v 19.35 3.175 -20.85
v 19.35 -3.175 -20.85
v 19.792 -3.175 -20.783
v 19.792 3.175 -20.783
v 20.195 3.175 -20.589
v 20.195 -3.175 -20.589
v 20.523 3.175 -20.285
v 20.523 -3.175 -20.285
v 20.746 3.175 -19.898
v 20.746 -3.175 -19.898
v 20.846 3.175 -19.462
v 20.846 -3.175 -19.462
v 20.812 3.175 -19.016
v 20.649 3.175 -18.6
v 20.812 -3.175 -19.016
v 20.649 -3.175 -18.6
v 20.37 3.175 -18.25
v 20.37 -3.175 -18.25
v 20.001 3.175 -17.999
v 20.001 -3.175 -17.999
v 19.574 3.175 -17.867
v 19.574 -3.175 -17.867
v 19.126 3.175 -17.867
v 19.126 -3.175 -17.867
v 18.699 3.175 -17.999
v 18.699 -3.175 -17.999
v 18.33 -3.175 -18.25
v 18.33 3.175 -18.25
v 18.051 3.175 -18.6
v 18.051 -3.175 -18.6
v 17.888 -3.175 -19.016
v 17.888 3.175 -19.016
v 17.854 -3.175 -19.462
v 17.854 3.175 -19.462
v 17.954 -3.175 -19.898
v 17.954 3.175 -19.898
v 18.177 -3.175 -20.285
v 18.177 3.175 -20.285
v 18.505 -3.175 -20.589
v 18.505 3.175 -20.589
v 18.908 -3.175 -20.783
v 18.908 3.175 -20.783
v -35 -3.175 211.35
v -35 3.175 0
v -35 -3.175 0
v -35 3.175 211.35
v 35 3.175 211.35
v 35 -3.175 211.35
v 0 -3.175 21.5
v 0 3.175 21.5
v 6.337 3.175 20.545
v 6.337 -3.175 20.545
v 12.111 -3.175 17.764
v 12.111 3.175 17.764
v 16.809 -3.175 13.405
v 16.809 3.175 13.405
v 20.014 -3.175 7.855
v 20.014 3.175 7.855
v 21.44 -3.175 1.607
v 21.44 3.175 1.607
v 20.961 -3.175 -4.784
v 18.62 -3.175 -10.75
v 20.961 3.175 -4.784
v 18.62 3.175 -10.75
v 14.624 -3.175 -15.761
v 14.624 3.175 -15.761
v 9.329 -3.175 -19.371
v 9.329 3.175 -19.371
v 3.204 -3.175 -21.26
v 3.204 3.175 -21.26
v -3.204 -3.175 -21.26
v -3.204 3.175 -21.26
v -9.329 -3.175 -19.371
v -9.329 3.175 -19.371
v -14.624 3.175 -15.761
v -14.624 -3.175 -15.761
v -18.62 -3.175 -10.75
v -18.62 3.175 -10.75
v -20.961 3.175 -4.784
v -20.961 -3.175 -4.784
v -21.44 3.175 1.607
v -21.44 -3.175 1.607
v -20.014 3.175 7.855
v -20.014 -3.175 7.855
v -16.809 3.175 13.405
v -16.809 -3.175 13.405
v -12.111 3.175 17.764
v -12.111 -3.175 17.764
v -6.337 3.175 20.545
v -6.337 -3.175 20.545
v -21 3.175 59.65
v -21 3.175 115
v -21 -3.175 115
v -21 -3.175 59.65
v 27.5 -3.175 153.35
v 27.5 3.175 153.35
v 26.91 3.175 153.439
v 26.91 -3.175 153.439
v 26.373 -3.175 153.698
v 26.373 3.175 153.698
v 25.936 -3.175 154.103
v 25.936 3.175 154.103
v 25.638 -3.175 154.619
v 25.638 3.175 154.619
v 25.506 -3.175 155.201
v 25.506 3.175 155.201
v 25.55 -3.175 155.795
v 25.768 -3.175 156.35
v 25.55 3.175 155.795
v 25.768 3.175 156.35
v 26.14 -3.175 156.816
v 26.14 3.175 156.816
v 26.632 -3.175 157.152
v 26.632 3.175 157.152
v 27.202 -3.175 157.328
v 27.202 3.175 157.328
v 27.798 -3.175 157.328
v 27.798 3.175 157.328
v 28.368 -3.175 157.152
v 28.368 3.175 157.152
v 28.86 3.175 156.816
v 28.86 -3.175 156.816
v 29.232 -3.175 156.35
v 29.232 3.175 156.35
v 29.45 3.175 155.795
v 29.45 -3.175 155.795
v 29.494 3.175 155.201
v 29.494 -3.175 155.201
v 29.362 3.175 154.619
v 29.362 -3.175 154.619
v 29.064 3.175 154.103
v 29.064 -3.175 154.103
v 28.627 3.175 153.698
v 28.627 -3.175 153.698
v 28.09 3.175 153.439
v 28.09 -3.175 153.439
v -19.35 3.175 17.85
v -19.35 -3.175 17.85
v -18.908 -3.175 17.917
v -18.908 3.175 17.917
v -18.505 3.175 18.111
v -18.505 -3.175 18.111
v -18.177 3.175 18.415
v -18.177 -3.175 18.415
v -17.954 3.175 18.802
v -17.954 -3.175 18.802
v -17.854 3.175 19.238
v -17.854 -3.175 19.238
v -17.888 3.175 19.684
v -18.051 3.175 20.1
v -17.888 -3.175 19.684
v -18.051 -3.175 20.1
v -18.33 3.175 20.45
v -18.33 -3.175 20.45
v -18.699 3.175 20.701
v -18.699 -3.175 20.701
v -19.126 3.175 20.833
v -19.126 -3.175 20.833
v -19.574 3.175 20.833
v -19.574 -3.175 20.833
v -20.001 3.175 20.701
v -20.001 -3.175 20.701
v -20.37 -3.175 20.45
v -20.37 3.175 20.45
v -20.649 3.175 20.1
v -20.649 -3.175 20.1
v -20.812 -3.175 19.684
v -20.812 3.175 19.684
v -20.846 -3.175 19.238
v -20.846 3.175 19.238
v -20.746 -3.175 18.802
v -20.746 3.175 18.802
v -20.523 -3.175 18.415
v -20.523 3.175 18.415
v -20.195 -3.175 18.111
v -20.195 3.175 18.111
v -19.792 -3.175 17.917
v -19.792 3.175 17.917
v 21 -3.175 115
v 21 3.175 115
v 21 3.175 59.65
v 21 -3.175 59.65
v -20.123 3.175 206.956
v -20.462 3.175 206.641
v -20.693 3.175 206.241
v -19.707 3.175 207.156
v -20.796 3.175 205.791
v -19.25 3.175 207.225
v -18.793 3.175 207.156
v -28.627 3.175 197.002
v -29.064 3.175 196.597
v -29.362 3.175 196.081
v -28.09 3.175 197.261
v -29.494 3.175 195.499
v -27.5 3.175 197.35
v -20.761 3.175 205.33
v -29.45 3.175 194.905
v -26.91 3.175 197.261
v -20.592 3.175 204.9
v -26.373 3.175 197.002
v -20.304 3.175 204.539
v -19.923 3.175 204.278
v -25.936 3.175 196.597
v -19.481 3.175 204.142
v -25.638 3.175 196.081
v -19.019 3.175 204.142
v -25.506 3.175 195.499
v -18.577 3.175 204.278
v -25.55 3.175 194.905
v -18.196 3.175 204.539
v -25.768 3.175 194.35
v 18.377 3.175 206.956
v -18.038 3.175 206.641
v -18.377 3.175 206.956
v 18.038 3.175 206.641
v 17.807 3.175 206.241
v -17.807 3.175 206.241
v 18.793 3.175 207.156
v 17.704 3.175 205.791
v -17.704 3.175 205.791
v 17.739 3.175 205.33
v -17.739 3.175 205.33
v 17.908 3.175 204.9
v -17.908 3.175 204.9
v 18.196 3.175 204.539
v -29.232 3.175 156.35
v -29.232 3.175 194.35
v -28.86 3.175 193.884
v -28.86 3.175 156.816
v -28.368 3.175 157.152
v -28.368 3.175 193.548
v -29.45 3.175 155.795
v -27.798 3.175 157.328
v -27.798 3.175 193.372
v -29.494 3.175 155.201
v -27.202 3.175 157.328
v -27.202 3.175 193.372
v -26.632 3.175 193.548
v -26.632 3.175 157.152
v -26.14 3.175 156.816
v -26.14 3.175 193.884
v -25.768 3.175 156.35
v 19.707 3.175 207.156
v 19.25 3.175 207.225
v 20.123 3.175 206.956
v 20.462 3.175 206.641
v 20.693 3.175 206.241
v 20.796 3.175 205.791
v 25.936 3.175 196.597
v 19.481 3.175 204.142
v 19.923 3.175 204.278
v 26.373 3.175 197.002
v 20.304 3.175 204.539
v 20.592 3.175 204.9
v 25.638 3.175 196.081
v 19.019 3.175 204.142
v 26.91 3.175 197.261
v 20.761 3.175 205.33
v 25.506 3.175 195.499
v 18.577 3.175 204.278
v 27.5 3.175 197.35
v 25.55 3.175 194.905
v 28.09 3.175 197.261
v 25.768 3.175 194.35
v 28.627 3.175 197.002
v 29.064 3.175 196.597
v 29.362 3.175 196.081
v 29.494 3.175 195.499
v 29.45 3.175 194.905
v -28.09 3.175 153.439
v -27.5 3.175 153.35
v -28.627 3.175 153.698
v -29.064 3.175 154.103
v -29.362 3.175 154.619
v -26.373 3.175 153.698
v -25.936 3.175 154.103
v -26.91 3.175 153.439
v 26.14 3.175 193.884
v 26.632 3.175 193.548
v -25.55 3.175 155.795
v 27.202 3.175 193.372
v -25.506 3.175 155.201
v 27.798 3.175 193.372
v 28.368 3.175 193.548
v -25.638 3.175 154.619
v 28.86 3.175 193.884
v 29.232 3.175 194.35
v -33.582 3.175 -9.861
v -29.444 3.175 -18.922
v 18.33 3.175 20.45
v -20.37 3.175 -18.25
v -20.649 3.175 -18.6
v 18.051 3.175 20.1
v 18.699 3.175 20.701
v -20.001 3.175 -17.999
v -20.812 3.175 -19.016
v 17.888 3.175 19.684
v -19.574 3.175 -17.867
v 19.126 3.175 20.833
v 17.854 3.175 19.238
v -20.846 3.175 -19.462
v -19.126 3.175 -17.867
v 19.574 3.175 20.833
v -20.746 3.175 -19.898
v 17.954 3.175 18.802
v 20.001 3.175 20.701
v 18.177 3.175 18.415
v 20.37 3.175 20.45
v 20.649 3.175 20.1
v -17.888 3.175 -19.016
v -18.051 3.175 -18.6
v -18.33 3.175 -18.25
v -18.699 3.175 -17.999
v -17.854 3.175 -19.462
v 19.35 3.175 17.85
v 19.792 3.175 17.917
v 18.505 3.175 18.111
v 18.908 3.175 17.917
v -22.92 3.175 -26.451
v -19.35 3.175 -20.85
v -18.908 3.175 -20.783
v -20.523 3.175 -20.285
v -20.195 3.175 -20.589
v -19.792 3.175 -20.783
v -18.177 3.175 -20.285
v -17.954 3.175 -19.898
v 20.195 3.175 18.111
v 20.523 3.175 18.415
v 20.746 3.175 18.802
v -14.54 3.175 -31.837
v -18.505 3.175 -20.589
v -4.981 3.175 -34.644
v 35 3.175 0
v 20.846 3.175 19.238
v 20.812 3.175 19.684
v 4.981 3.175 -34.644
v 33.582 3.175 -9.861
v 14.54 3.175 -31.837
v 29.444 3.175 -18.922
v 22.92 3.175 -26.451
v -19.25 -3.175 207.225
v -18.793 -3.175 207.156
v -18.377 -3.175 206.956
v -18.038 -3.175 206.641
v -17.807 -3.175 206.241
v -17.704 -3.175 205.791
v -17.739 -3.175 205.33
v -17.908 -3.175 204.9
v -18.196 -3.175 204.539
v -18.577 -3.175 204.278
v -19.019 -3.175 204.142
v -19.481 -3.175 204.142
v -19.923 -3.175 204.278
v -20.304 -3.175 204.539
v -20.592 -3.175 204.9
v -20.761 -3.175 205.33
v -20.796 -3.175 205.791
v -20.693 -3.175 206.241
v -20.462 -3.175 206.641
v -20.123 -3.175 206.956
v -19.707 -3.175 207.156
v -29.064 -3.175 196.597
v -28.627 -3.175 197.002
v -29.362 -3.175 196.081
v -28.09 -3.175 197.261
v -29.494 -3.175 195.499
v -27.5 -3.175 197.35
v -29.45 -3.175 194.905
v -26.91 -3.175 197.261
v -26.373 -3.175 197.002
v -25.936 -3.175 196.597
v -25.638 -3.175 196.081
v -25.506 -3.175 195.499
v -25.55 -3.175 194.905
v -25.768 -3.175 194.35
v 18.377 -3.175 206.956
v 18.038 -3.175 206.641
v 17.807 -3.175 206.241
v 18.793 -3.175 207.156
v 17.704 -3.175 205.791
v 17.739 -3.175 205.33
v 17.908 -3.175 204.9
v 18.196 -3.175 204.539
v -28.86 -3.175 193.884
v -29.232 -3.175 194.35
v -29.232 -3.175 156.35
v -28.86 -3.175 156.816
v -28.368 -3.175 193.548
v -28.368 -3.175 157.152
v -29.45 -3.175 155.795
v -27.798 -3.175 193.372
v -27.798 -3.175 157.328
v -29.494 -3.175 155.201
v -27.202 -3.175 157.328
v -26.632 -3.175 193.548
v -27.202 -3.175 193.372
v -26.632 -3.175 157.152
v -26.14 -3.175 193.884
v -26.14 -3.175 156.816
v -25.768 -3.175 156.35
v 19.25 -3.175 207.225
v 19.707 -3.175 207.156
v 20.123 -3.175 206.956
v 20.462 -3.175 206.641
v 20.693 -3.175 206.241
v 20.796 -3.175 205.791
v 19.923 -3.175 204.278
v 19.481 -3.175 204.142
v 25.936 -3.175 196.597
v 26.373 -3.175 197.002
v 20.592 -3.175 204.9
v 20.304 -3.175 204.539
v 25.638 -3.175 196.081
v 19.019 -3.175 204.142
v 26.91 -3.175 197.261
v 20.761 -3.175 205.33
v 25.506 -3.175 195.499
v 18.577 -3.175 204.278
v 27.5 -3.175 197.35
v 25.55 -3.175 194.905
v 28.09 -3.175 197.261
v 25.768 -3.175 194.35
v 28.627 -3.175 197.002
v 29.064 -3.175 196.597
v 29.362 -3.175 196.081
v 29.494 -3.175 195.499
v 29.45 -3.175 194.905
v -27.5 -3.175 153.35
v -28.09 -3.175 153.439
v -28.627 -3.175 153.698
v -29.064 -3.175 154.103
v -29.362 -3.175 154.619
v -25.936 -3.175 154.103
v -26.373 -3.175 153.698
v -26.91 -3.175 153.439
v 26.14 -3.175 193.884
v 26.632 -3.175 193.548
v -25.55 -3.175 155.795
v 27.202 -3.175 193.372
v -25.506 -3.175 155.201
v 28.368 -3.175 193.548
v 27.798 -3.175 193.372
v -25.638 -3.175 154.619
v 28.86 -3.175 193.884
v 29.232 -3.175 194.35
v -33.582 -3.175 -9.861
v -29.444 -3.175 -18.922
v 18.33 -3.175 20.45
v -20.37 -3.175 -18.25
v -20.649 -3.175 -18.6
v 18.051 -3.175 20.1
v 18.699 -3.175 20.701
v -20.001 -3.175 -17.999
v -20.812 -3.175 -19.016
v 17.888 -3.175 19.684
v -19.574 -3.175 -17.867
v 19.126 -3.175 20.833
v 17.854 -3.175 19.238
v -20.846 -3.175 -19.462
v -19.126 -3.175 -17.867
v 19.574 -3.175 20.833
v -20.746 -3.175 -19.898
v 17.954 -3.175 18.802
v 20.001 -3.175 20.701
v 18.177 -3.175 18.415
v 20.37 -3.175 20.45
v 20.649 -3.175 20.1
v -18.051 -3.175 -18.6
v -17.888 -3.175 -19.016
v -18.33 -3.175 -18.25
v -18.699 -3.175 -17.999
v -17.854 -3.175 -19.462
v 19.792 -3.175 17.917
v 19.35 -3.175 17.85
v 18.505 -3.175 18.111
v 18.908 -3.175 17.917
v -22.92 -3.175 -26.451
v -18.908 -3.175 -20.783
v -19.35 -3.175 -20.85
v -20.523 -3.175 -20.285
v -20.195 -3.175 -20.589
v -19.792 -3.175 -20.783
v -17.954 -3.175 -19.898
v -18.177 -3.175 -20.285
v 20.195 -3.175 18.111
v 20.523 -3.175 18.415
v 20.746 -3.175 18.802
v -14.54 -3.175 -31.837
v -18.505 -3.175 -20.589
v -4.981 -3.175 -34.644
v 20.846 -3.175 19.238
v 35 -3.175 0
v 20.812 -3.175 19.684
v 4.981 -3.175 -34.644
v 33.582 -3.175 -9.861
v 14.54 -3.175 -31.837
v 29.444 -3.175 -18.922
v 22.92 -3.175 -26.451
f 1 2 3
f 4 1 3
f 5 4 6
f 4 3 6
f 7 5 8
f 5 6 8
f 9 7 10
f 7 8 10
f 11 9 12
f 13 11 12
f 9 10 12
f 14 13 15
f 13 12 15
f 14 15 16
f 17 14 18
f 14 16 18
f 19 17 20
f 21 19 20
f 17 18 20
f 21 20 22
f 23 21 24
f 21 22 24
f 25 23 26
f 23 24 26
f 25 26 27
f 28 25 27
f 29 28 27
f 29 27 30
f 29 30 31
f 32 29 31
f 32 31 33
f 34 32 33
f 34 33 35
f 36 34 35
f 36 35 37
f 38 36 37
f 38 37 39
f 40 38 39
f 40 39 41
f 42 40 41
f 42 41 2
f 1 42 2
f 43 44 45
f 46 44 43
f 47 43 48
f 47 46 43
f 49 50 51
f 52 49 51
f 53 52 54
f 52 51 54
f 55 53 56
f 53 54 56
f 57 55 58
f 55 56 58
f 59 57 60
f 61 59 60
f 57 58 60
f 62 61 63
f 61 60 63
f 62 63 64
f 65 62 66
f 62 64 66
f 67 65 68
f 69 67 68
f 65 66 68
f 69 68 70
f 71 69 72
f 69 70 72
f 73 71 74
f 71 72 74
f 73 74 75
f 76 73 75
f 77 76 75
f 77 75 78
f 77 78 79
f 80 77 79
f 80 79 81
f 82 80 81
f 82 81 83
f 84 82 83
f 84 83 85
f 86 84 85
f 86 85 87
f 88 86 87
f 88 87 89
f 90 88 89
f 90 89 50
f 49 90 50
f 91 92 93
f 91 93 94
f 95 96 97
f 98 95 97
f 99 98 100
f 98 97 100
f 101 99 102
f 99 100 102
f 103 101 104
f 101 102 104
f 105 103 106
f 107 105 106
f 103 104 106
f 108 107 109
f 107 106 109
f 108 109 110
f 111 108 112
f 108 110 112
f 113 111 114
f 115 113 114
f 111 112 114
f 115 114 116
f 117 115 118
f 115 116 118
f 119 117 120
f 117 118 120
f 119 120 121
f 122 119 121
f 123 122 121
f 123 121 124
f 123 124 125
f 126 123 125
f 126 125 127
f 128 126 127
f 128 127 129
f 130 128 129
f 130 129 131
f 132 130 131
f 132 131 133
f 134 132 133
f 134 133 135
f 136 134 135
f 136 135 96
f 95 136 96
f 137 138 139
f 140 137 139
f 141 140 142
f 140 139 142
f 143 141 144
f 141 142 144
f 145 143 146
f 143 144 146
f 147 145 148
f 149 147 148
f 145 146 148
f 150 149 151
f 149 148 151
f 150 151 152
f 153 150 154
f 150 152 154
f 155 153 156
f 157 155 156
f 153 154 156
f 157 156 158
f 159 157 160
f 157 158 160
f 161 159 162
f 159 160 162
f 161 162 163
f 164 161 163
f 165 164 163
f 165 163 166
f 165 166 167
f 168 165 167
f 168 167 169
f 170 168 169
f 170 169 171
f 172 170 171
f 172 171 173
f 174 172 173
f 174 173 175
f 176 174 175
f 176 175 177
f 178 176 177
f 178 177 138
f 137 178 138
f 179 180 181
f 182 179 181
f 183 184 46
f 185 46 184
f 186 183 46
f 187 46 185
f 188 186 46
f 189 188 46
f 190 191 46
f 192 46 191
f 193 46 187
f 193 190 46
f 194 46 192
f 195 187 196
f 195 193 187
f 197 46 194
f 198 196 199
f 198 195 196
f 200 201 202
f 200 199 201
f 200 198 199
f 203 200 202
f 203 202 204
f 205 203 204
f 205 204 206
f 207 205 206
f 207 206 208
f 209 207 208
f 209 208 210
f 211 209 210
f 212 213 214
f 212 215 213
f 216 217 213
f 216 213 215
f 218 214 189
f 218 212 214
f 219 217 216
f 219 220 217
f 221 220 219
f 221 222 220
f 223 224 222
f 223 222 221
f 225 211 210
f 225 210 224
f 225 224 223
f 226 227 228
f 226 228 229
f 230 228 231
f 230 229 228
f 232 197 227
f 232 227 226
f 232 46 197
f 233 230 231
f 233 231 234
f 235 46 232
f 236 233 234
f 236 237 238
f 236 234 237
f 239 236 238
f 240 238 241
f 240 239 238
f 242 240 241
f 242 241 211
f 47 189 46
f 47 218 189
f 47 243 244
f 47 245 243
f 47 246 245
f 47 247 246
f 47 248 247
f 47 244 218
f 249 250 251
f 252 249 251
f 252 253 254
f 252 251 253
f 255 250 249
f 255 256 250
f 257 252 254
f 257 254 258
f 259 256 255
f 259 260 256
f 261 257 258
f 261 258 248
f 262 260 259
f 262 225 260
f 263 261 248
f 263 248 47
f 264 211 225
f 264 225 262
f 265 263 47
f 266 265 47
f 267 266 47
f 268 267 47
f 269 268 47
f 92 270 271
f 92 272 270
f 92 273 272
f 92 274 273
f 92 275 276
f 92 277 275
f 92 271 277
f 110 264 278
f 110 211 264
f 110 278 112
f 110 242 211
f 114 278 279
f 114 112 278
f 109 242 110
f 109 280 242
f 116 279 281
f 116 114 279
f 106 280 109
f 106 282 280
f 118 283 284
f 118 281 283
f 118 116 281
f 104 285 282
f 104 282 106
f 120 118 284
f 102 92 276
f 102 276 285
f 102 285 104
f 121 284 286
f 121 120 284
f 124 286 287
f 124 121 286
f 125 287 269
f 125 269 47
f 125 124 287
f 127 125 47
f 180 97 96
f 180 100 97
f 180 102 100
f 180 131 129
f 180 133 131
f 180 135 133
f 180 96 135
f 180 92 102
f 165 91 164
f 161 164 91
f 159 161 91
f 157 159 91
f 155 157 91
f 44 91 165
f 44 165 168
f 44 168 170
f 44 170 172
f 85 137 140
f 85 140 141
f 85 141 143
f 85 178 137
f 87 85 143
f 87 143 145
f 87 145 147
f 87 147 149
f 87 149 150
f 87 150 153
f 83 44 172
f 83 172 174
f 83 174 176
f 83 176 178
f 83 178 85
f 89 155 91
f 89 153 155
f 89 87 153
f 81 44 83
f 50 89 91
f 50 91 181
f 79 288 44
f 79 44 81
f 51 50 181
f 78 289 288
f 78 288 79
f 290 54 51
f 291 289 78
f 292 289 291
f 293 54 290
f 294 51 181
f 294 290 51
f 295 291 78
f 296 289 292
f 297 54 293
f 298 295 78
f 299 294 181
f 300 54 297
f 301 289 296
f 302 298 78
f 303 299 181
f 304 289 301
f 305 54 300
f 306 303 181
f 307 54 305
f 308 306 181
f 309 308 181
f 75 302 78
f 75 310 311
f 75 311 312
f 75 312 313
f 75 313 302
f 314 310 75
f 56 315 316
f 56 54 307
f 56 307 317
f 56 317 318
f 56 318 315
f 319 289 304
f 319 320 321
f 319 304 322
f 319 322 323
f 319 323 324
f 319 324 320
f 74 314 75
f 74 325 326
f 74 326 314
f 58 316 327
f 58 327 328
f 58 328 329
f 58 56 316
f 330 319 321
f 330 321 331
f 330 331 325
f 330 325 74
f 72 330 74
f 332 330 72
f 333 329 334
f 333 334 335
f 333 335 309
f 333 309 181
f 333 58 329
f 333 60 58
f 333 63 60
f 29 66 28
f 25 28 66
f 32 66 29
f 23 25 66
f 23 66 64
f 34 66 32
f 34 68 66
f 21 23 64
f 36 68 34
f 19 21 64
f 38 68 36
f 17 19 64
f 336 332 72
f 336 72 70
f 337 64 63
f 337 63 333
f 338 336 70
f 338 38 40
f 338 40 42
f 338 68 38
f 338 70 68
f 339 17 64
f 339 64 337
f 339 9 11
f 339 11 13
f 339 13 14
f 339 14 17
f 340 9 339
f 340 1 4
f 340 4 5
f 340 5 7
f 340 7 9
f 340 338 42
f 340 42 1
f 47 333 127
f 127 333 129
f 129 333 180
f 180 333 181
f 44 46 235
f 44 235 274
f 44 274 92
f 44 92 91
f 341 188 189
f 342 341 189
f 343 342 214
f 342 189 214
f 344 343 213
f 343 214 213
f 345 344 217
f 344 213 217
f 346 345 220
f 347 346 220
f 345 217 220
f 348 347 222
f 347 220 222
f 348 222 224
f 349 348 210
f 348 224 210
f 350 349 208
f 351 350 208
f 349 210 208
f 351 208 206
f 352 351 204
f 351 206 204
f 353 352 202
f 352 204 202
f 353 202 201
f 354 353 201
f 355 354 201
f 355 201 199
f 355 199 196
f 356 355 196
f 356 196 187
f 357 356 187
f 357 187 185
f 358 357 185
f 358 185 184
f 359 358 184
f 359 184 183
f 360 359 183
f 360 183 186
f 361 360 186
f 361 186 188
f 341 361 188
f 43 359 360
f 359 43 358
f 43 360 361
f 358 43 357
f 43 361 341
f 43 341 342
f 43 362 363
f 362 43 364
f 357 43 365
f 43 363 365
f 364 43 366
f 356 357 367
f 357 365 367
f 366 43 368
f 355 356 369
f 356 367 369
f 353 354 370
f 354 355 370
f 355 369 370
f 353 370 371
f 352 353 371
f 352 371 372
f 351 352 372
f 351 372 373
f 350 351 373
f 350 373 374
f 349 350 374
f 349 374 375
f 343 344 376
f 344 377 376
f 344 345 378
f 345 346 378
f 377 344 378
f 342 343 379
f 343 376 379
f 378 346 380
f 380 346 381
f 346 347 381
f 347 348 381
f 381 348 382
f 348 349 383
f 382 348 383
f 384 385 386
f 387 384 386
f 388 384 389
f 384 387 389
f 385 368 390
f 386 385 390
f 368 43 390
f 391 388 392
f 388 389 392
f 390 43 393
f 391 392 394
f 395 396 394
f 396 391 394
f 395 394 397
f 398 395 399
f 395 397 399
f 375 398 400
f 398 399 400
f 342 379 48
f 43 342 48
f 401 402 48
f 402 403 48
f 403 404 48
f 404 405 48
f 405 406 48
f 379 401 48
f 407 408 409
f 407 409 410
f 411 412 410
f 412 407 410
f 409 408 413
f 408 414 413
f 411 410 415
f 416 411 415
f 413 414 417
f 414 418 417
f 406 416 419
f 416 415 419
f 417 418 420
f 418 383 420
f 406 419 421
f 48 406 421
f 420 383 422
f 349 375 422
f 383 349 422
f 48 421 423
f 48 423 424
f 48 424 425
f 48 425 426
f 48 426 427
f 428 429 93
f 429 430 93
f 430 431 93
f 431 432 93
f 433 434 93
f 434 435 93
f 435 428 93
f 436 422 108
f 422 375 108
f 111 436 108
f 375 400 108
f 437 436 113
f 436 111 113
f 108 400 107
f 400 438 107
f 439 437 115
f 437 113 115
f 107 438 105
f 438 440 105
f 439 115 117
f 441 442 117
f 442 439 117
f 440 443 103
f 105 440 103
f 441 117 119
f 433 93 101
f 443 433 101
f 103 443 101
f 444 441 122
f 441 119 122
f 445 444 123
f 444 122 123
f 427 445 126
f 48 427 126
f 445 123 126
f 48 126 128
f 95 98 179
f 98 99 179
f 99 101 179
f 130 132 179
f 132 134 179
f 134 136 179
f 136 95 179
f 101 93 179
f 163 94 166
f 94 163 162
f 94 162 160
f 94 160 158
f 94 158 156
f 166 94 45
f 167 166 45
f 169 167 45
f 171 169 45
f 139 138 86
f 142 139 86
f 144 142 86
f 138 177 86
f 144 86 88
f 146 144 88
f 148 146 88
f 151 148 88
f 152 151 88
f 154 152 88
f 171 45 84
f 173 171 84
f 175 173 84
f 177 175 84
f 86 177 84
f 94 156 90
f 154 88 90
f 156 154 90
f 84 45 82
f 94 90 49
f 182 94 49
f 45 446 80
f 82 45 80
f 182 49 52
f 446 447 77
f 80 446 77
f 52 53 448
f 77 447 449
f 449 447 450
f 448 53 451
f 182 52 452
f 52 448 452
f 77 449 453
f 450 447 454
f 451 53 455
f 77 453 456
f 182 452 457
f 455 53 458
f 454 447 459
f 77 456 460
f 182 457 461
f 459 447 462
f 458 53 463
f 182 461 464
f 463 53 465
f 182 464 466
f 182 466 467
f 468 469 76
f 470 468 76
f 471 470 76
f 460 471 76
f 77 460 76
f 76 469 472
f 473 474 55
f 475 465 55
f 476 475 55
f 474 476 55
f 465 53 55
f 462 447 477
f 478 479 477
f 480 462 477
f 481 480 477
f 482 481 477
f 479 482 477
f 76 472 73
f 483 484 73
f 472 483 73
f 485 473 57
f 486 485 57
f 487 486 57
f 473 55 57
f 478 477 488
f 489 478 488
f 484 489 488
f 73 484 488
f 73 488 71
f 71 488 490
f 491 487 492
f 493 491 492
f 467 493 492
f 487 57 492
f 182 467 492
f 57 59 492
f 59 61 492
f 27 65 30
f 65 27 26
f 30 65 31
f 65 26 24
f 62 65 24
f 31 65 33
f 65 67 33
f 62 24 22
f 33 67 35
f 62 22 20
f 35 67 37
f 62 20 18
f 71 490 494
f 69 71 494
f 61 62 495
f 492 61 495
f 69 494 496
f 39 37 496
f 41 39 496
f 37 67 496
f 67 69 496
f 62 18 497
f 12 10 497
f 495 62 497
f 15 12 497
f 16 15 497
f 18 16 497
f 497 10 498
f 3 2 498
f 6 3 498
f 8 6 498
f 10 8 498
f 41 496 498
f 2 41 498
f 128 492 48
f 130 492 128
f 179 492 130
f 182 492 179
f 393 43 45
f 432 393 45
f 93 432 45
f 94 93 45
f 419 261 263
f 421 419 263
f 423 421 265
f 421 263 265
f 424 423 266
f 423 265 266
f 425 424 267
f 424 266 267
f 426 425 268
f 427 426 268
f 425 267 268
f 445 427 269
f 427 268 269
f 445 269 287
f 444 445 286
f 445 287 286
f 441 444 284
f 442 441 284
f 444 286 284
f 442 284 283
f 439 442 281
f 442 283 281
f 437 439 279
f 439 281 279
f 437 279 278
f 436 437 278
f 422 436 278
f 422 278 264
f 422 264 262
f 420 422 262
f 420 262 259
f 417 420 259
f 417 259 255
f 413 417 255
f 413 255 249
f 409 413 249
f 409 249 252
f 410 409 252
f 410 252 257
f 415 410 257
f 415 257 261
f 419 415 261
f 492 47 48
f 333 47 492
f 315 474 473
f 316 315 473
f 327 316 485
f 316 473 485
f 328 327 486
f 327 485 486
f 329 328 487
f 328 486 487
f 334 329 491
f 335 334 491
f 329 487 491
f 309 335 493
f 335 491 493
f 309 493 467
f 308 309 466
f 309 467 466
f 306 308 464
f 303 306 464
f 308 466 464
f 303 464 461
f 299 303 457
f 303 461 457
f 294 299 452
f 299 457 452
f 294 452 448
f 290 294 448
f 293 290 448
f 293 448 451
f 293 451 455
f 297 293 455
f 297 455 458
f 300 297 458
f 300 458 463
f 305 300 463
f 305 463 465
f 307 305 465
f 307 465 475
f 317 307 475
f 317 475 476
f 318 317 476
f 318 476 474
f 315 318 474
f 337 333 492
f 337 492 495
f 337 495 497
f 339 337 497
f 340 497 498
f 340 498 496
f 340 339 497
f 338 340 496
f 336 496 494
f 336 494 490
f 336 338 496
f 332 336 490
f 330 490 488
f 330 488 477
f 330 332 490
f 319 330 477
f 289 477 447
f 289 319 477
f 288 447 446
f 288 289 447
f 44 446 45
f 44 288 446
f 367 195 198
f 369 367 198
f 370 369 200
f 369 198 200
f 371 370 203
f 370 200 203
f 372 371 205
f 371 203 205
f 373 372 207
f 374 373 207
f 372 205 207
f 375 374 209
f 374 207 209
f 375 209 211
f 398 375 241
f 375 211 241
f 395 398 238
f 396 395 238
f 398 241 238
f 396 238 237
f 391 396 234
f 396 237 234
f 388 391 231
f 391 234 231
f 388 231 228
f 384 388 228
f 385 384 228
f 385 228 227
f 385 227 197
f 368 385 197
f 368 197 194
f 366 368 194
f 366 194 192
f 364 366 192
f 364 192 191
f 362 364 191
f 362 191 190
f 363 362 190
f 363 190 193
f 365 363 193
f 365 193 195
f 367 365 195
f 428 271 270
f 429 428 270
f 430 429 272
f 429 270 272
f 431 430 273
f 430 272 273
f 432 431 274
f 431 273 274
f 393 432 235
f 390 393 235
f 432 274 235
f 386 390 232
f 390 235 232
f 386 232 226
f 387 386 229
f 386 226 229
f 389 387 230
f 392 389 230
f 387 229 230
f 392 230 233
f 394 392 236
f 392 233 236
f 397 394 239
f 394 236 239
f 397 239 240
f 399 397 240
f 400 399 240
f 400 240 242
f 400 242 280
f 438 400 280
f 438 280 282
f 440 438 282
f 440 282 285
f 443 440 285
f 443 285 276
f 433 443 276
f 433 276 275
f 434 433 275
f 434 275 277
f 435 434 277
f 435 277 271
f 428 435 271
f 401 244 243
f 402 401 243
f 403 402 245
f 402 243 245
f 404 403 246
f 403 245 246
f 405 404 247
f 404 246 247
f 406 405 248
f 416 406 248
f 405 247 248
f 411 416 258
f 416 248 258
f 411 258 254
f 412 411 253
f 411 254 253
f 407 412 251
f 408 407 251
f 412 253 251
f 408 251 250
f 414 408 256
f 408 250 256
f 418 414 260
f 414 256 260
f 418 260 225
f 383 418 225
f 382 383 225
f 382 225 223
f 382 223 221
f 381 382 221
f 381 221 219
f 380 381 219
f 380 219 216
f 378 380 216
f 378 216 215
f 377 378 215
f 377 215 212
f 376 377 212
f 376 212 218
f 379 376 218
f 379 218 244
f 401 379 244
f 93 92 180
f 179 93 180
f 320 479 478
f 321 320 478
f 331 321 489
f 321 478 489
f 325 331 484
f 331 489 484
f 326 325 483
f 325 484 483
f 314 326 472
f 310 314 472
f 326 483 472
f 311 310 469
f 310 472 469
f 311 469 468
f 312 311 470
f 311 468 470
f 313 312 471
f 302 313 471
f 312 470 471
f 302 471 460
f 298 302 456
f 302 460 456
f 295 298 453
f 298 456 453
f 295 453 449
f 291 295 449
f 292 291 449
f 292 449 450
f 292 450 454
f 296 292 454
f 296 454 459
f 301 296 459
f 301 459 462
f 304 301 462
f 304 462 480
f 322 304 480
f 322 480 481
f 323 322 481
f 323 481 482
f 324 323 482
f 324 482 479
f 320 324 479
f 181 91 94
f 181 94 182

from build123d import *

# Parameters (mm, degrees)
BOSS_EXTRUDE1_DEPTH = 3.175
SKETCH2_R           = 21.5
CUT_EXTRUDE1_DEPTH  = 215.322525648
SKETCH3_W           = 42
SKETCH3_H           = 55.35
CUT_EXTRUDE2_DEPTH  = 215.322525648
SKETCH4_R           = 1.5
CUT_EXTRUDE3_DEPTH  = 215.322525648
SKETCH5_R           = 2
CUT_EXTRUDE4_DEPTH  = 215.322525648
SKETCH7_R           = 1.55
CUT_EXTRUDE6_DEPTH  = 10


with BuildPart() as part:
    # Sketch1 → Boss-Extrude1 (new, symmetric)
    with BuildSketch(Plane(origin=(0, 0, 0), x_dir=(1, 0, 0), z_dir=(0, 1, 0))):
        with BuildLine():
            Line((35, -211.35), (35, 0))
            ThreePointArc((35, 0), (0, 35), (-35, 0))
            Line((-35, 0), (-35, -211.35))
            Line((-35, -211.35), (35, -211.35))
        make_face()
    extrude(amount=BOSS_EXTRUDE1_DEPTH, both=True)

    # Sketch2 → Cut-Extrude1 (cut, through all)
    with BuildSketch(Plane(origin=(0, 3.175, 0), x_dir=(1, 0, 0), z_dir=(0, 1, 0))):
        with Locations(Location((0, 0, 0), (0, 0, 270))):
            Circle(SKETCH2_R)
    extrude(amount=-CUT_EXTRUDE1_DEPTH, mode=Mode.SUBTRACT)

    # Sketch3 → Cut-Extrude2 (cut, through all)
    with BuildSketch(Plane(origin=(0, 3.175, 0), x_dir=(1, 0, 0), z_dir=(0, 1, 0))):
        with Locations((0, -87.325)):
            Rectangle(SKETCH3_W, SKETCH3_H)
    extrude(amount=-CUT_EXTRUDE2_DEPTH, mode=Mode.SUBTRACT)

    # Sketch4 → Cut-Extrude3 (cut, through all)
    with BuildSketch(Plane.XZ.offset(3.175)):
        with Locations(Location((-19.35, 19.35, 0), (0, 0, 270))):
            Circle(SKETCH4_R)
        with Locations(Location((19.35, 19.35, 0), (0, 0, 270))):
            Circle(SKETCH4_R)
        with Locations(Location((19.35, -19.35, 0), (0, 0, 270))):
            Circle(SKETCH4_R)
        with Locations(Location((-19.35, -19.35, 0), (0, 0, 270))):
            Circle(SKETCH4_R)
    extrude(amount=-CUT_EXTRUDE3_DEPTH, mode=Mode.SUBTRACT)

    # Sketch5 → Cut-Extrude4 (cut, through all)
    with BuildSketch(Plane(origin=(0, 3.175, 0), x_dir=(1, 0, 0), z_dir=(0, 1, 0))):
        with Locations((15, -65.35)):
            Circle(SKETCH5_R)
        with Locations((-15, -65.35)):
            Circle(SKETCH5_R)
        with Locations(Location((27.5, -195.35, 0), (0, 0, 270))):
            Circle(SKETCH5_R)
        with Locations(Location((-27.5, -195.35, 0), (0, 0, 270))):
            Circle(SKETCH5_R)
        with Locations(Location((27.5, -155.35, 0), (0, 0, 90))):
            Circle(SKETCH5_R)
        with Locations(Location((-27.5, -155.35, 0), (0, 0, 90))):
            Circle(SKETCH5_R)
    extrude(amount=-CUT_EXTRUDE4_DEPTH, mode=Mode.SUBTRACT)

    # Sketch7 → Cut-Extrude6 (cut)
    with BuildSketch(Plane(origin=(0, 3.175, 0), x_dir=(1, 0, 0), z_dir=(0, 1, 0))):
        with Locations(Location((-19.25, -205.675, 0), (0, 0, 270))):
            Circle(SKETCH7_R)
        with Locations(Location((19.25, -205.675, 0), (0, 0, 270))):
            Circle(SKETCH7_R)
    extrude(amount=-CUT_EXTRUDE6_DEPTH, mode=Mode.SUBTRACT)


solid = part.part
